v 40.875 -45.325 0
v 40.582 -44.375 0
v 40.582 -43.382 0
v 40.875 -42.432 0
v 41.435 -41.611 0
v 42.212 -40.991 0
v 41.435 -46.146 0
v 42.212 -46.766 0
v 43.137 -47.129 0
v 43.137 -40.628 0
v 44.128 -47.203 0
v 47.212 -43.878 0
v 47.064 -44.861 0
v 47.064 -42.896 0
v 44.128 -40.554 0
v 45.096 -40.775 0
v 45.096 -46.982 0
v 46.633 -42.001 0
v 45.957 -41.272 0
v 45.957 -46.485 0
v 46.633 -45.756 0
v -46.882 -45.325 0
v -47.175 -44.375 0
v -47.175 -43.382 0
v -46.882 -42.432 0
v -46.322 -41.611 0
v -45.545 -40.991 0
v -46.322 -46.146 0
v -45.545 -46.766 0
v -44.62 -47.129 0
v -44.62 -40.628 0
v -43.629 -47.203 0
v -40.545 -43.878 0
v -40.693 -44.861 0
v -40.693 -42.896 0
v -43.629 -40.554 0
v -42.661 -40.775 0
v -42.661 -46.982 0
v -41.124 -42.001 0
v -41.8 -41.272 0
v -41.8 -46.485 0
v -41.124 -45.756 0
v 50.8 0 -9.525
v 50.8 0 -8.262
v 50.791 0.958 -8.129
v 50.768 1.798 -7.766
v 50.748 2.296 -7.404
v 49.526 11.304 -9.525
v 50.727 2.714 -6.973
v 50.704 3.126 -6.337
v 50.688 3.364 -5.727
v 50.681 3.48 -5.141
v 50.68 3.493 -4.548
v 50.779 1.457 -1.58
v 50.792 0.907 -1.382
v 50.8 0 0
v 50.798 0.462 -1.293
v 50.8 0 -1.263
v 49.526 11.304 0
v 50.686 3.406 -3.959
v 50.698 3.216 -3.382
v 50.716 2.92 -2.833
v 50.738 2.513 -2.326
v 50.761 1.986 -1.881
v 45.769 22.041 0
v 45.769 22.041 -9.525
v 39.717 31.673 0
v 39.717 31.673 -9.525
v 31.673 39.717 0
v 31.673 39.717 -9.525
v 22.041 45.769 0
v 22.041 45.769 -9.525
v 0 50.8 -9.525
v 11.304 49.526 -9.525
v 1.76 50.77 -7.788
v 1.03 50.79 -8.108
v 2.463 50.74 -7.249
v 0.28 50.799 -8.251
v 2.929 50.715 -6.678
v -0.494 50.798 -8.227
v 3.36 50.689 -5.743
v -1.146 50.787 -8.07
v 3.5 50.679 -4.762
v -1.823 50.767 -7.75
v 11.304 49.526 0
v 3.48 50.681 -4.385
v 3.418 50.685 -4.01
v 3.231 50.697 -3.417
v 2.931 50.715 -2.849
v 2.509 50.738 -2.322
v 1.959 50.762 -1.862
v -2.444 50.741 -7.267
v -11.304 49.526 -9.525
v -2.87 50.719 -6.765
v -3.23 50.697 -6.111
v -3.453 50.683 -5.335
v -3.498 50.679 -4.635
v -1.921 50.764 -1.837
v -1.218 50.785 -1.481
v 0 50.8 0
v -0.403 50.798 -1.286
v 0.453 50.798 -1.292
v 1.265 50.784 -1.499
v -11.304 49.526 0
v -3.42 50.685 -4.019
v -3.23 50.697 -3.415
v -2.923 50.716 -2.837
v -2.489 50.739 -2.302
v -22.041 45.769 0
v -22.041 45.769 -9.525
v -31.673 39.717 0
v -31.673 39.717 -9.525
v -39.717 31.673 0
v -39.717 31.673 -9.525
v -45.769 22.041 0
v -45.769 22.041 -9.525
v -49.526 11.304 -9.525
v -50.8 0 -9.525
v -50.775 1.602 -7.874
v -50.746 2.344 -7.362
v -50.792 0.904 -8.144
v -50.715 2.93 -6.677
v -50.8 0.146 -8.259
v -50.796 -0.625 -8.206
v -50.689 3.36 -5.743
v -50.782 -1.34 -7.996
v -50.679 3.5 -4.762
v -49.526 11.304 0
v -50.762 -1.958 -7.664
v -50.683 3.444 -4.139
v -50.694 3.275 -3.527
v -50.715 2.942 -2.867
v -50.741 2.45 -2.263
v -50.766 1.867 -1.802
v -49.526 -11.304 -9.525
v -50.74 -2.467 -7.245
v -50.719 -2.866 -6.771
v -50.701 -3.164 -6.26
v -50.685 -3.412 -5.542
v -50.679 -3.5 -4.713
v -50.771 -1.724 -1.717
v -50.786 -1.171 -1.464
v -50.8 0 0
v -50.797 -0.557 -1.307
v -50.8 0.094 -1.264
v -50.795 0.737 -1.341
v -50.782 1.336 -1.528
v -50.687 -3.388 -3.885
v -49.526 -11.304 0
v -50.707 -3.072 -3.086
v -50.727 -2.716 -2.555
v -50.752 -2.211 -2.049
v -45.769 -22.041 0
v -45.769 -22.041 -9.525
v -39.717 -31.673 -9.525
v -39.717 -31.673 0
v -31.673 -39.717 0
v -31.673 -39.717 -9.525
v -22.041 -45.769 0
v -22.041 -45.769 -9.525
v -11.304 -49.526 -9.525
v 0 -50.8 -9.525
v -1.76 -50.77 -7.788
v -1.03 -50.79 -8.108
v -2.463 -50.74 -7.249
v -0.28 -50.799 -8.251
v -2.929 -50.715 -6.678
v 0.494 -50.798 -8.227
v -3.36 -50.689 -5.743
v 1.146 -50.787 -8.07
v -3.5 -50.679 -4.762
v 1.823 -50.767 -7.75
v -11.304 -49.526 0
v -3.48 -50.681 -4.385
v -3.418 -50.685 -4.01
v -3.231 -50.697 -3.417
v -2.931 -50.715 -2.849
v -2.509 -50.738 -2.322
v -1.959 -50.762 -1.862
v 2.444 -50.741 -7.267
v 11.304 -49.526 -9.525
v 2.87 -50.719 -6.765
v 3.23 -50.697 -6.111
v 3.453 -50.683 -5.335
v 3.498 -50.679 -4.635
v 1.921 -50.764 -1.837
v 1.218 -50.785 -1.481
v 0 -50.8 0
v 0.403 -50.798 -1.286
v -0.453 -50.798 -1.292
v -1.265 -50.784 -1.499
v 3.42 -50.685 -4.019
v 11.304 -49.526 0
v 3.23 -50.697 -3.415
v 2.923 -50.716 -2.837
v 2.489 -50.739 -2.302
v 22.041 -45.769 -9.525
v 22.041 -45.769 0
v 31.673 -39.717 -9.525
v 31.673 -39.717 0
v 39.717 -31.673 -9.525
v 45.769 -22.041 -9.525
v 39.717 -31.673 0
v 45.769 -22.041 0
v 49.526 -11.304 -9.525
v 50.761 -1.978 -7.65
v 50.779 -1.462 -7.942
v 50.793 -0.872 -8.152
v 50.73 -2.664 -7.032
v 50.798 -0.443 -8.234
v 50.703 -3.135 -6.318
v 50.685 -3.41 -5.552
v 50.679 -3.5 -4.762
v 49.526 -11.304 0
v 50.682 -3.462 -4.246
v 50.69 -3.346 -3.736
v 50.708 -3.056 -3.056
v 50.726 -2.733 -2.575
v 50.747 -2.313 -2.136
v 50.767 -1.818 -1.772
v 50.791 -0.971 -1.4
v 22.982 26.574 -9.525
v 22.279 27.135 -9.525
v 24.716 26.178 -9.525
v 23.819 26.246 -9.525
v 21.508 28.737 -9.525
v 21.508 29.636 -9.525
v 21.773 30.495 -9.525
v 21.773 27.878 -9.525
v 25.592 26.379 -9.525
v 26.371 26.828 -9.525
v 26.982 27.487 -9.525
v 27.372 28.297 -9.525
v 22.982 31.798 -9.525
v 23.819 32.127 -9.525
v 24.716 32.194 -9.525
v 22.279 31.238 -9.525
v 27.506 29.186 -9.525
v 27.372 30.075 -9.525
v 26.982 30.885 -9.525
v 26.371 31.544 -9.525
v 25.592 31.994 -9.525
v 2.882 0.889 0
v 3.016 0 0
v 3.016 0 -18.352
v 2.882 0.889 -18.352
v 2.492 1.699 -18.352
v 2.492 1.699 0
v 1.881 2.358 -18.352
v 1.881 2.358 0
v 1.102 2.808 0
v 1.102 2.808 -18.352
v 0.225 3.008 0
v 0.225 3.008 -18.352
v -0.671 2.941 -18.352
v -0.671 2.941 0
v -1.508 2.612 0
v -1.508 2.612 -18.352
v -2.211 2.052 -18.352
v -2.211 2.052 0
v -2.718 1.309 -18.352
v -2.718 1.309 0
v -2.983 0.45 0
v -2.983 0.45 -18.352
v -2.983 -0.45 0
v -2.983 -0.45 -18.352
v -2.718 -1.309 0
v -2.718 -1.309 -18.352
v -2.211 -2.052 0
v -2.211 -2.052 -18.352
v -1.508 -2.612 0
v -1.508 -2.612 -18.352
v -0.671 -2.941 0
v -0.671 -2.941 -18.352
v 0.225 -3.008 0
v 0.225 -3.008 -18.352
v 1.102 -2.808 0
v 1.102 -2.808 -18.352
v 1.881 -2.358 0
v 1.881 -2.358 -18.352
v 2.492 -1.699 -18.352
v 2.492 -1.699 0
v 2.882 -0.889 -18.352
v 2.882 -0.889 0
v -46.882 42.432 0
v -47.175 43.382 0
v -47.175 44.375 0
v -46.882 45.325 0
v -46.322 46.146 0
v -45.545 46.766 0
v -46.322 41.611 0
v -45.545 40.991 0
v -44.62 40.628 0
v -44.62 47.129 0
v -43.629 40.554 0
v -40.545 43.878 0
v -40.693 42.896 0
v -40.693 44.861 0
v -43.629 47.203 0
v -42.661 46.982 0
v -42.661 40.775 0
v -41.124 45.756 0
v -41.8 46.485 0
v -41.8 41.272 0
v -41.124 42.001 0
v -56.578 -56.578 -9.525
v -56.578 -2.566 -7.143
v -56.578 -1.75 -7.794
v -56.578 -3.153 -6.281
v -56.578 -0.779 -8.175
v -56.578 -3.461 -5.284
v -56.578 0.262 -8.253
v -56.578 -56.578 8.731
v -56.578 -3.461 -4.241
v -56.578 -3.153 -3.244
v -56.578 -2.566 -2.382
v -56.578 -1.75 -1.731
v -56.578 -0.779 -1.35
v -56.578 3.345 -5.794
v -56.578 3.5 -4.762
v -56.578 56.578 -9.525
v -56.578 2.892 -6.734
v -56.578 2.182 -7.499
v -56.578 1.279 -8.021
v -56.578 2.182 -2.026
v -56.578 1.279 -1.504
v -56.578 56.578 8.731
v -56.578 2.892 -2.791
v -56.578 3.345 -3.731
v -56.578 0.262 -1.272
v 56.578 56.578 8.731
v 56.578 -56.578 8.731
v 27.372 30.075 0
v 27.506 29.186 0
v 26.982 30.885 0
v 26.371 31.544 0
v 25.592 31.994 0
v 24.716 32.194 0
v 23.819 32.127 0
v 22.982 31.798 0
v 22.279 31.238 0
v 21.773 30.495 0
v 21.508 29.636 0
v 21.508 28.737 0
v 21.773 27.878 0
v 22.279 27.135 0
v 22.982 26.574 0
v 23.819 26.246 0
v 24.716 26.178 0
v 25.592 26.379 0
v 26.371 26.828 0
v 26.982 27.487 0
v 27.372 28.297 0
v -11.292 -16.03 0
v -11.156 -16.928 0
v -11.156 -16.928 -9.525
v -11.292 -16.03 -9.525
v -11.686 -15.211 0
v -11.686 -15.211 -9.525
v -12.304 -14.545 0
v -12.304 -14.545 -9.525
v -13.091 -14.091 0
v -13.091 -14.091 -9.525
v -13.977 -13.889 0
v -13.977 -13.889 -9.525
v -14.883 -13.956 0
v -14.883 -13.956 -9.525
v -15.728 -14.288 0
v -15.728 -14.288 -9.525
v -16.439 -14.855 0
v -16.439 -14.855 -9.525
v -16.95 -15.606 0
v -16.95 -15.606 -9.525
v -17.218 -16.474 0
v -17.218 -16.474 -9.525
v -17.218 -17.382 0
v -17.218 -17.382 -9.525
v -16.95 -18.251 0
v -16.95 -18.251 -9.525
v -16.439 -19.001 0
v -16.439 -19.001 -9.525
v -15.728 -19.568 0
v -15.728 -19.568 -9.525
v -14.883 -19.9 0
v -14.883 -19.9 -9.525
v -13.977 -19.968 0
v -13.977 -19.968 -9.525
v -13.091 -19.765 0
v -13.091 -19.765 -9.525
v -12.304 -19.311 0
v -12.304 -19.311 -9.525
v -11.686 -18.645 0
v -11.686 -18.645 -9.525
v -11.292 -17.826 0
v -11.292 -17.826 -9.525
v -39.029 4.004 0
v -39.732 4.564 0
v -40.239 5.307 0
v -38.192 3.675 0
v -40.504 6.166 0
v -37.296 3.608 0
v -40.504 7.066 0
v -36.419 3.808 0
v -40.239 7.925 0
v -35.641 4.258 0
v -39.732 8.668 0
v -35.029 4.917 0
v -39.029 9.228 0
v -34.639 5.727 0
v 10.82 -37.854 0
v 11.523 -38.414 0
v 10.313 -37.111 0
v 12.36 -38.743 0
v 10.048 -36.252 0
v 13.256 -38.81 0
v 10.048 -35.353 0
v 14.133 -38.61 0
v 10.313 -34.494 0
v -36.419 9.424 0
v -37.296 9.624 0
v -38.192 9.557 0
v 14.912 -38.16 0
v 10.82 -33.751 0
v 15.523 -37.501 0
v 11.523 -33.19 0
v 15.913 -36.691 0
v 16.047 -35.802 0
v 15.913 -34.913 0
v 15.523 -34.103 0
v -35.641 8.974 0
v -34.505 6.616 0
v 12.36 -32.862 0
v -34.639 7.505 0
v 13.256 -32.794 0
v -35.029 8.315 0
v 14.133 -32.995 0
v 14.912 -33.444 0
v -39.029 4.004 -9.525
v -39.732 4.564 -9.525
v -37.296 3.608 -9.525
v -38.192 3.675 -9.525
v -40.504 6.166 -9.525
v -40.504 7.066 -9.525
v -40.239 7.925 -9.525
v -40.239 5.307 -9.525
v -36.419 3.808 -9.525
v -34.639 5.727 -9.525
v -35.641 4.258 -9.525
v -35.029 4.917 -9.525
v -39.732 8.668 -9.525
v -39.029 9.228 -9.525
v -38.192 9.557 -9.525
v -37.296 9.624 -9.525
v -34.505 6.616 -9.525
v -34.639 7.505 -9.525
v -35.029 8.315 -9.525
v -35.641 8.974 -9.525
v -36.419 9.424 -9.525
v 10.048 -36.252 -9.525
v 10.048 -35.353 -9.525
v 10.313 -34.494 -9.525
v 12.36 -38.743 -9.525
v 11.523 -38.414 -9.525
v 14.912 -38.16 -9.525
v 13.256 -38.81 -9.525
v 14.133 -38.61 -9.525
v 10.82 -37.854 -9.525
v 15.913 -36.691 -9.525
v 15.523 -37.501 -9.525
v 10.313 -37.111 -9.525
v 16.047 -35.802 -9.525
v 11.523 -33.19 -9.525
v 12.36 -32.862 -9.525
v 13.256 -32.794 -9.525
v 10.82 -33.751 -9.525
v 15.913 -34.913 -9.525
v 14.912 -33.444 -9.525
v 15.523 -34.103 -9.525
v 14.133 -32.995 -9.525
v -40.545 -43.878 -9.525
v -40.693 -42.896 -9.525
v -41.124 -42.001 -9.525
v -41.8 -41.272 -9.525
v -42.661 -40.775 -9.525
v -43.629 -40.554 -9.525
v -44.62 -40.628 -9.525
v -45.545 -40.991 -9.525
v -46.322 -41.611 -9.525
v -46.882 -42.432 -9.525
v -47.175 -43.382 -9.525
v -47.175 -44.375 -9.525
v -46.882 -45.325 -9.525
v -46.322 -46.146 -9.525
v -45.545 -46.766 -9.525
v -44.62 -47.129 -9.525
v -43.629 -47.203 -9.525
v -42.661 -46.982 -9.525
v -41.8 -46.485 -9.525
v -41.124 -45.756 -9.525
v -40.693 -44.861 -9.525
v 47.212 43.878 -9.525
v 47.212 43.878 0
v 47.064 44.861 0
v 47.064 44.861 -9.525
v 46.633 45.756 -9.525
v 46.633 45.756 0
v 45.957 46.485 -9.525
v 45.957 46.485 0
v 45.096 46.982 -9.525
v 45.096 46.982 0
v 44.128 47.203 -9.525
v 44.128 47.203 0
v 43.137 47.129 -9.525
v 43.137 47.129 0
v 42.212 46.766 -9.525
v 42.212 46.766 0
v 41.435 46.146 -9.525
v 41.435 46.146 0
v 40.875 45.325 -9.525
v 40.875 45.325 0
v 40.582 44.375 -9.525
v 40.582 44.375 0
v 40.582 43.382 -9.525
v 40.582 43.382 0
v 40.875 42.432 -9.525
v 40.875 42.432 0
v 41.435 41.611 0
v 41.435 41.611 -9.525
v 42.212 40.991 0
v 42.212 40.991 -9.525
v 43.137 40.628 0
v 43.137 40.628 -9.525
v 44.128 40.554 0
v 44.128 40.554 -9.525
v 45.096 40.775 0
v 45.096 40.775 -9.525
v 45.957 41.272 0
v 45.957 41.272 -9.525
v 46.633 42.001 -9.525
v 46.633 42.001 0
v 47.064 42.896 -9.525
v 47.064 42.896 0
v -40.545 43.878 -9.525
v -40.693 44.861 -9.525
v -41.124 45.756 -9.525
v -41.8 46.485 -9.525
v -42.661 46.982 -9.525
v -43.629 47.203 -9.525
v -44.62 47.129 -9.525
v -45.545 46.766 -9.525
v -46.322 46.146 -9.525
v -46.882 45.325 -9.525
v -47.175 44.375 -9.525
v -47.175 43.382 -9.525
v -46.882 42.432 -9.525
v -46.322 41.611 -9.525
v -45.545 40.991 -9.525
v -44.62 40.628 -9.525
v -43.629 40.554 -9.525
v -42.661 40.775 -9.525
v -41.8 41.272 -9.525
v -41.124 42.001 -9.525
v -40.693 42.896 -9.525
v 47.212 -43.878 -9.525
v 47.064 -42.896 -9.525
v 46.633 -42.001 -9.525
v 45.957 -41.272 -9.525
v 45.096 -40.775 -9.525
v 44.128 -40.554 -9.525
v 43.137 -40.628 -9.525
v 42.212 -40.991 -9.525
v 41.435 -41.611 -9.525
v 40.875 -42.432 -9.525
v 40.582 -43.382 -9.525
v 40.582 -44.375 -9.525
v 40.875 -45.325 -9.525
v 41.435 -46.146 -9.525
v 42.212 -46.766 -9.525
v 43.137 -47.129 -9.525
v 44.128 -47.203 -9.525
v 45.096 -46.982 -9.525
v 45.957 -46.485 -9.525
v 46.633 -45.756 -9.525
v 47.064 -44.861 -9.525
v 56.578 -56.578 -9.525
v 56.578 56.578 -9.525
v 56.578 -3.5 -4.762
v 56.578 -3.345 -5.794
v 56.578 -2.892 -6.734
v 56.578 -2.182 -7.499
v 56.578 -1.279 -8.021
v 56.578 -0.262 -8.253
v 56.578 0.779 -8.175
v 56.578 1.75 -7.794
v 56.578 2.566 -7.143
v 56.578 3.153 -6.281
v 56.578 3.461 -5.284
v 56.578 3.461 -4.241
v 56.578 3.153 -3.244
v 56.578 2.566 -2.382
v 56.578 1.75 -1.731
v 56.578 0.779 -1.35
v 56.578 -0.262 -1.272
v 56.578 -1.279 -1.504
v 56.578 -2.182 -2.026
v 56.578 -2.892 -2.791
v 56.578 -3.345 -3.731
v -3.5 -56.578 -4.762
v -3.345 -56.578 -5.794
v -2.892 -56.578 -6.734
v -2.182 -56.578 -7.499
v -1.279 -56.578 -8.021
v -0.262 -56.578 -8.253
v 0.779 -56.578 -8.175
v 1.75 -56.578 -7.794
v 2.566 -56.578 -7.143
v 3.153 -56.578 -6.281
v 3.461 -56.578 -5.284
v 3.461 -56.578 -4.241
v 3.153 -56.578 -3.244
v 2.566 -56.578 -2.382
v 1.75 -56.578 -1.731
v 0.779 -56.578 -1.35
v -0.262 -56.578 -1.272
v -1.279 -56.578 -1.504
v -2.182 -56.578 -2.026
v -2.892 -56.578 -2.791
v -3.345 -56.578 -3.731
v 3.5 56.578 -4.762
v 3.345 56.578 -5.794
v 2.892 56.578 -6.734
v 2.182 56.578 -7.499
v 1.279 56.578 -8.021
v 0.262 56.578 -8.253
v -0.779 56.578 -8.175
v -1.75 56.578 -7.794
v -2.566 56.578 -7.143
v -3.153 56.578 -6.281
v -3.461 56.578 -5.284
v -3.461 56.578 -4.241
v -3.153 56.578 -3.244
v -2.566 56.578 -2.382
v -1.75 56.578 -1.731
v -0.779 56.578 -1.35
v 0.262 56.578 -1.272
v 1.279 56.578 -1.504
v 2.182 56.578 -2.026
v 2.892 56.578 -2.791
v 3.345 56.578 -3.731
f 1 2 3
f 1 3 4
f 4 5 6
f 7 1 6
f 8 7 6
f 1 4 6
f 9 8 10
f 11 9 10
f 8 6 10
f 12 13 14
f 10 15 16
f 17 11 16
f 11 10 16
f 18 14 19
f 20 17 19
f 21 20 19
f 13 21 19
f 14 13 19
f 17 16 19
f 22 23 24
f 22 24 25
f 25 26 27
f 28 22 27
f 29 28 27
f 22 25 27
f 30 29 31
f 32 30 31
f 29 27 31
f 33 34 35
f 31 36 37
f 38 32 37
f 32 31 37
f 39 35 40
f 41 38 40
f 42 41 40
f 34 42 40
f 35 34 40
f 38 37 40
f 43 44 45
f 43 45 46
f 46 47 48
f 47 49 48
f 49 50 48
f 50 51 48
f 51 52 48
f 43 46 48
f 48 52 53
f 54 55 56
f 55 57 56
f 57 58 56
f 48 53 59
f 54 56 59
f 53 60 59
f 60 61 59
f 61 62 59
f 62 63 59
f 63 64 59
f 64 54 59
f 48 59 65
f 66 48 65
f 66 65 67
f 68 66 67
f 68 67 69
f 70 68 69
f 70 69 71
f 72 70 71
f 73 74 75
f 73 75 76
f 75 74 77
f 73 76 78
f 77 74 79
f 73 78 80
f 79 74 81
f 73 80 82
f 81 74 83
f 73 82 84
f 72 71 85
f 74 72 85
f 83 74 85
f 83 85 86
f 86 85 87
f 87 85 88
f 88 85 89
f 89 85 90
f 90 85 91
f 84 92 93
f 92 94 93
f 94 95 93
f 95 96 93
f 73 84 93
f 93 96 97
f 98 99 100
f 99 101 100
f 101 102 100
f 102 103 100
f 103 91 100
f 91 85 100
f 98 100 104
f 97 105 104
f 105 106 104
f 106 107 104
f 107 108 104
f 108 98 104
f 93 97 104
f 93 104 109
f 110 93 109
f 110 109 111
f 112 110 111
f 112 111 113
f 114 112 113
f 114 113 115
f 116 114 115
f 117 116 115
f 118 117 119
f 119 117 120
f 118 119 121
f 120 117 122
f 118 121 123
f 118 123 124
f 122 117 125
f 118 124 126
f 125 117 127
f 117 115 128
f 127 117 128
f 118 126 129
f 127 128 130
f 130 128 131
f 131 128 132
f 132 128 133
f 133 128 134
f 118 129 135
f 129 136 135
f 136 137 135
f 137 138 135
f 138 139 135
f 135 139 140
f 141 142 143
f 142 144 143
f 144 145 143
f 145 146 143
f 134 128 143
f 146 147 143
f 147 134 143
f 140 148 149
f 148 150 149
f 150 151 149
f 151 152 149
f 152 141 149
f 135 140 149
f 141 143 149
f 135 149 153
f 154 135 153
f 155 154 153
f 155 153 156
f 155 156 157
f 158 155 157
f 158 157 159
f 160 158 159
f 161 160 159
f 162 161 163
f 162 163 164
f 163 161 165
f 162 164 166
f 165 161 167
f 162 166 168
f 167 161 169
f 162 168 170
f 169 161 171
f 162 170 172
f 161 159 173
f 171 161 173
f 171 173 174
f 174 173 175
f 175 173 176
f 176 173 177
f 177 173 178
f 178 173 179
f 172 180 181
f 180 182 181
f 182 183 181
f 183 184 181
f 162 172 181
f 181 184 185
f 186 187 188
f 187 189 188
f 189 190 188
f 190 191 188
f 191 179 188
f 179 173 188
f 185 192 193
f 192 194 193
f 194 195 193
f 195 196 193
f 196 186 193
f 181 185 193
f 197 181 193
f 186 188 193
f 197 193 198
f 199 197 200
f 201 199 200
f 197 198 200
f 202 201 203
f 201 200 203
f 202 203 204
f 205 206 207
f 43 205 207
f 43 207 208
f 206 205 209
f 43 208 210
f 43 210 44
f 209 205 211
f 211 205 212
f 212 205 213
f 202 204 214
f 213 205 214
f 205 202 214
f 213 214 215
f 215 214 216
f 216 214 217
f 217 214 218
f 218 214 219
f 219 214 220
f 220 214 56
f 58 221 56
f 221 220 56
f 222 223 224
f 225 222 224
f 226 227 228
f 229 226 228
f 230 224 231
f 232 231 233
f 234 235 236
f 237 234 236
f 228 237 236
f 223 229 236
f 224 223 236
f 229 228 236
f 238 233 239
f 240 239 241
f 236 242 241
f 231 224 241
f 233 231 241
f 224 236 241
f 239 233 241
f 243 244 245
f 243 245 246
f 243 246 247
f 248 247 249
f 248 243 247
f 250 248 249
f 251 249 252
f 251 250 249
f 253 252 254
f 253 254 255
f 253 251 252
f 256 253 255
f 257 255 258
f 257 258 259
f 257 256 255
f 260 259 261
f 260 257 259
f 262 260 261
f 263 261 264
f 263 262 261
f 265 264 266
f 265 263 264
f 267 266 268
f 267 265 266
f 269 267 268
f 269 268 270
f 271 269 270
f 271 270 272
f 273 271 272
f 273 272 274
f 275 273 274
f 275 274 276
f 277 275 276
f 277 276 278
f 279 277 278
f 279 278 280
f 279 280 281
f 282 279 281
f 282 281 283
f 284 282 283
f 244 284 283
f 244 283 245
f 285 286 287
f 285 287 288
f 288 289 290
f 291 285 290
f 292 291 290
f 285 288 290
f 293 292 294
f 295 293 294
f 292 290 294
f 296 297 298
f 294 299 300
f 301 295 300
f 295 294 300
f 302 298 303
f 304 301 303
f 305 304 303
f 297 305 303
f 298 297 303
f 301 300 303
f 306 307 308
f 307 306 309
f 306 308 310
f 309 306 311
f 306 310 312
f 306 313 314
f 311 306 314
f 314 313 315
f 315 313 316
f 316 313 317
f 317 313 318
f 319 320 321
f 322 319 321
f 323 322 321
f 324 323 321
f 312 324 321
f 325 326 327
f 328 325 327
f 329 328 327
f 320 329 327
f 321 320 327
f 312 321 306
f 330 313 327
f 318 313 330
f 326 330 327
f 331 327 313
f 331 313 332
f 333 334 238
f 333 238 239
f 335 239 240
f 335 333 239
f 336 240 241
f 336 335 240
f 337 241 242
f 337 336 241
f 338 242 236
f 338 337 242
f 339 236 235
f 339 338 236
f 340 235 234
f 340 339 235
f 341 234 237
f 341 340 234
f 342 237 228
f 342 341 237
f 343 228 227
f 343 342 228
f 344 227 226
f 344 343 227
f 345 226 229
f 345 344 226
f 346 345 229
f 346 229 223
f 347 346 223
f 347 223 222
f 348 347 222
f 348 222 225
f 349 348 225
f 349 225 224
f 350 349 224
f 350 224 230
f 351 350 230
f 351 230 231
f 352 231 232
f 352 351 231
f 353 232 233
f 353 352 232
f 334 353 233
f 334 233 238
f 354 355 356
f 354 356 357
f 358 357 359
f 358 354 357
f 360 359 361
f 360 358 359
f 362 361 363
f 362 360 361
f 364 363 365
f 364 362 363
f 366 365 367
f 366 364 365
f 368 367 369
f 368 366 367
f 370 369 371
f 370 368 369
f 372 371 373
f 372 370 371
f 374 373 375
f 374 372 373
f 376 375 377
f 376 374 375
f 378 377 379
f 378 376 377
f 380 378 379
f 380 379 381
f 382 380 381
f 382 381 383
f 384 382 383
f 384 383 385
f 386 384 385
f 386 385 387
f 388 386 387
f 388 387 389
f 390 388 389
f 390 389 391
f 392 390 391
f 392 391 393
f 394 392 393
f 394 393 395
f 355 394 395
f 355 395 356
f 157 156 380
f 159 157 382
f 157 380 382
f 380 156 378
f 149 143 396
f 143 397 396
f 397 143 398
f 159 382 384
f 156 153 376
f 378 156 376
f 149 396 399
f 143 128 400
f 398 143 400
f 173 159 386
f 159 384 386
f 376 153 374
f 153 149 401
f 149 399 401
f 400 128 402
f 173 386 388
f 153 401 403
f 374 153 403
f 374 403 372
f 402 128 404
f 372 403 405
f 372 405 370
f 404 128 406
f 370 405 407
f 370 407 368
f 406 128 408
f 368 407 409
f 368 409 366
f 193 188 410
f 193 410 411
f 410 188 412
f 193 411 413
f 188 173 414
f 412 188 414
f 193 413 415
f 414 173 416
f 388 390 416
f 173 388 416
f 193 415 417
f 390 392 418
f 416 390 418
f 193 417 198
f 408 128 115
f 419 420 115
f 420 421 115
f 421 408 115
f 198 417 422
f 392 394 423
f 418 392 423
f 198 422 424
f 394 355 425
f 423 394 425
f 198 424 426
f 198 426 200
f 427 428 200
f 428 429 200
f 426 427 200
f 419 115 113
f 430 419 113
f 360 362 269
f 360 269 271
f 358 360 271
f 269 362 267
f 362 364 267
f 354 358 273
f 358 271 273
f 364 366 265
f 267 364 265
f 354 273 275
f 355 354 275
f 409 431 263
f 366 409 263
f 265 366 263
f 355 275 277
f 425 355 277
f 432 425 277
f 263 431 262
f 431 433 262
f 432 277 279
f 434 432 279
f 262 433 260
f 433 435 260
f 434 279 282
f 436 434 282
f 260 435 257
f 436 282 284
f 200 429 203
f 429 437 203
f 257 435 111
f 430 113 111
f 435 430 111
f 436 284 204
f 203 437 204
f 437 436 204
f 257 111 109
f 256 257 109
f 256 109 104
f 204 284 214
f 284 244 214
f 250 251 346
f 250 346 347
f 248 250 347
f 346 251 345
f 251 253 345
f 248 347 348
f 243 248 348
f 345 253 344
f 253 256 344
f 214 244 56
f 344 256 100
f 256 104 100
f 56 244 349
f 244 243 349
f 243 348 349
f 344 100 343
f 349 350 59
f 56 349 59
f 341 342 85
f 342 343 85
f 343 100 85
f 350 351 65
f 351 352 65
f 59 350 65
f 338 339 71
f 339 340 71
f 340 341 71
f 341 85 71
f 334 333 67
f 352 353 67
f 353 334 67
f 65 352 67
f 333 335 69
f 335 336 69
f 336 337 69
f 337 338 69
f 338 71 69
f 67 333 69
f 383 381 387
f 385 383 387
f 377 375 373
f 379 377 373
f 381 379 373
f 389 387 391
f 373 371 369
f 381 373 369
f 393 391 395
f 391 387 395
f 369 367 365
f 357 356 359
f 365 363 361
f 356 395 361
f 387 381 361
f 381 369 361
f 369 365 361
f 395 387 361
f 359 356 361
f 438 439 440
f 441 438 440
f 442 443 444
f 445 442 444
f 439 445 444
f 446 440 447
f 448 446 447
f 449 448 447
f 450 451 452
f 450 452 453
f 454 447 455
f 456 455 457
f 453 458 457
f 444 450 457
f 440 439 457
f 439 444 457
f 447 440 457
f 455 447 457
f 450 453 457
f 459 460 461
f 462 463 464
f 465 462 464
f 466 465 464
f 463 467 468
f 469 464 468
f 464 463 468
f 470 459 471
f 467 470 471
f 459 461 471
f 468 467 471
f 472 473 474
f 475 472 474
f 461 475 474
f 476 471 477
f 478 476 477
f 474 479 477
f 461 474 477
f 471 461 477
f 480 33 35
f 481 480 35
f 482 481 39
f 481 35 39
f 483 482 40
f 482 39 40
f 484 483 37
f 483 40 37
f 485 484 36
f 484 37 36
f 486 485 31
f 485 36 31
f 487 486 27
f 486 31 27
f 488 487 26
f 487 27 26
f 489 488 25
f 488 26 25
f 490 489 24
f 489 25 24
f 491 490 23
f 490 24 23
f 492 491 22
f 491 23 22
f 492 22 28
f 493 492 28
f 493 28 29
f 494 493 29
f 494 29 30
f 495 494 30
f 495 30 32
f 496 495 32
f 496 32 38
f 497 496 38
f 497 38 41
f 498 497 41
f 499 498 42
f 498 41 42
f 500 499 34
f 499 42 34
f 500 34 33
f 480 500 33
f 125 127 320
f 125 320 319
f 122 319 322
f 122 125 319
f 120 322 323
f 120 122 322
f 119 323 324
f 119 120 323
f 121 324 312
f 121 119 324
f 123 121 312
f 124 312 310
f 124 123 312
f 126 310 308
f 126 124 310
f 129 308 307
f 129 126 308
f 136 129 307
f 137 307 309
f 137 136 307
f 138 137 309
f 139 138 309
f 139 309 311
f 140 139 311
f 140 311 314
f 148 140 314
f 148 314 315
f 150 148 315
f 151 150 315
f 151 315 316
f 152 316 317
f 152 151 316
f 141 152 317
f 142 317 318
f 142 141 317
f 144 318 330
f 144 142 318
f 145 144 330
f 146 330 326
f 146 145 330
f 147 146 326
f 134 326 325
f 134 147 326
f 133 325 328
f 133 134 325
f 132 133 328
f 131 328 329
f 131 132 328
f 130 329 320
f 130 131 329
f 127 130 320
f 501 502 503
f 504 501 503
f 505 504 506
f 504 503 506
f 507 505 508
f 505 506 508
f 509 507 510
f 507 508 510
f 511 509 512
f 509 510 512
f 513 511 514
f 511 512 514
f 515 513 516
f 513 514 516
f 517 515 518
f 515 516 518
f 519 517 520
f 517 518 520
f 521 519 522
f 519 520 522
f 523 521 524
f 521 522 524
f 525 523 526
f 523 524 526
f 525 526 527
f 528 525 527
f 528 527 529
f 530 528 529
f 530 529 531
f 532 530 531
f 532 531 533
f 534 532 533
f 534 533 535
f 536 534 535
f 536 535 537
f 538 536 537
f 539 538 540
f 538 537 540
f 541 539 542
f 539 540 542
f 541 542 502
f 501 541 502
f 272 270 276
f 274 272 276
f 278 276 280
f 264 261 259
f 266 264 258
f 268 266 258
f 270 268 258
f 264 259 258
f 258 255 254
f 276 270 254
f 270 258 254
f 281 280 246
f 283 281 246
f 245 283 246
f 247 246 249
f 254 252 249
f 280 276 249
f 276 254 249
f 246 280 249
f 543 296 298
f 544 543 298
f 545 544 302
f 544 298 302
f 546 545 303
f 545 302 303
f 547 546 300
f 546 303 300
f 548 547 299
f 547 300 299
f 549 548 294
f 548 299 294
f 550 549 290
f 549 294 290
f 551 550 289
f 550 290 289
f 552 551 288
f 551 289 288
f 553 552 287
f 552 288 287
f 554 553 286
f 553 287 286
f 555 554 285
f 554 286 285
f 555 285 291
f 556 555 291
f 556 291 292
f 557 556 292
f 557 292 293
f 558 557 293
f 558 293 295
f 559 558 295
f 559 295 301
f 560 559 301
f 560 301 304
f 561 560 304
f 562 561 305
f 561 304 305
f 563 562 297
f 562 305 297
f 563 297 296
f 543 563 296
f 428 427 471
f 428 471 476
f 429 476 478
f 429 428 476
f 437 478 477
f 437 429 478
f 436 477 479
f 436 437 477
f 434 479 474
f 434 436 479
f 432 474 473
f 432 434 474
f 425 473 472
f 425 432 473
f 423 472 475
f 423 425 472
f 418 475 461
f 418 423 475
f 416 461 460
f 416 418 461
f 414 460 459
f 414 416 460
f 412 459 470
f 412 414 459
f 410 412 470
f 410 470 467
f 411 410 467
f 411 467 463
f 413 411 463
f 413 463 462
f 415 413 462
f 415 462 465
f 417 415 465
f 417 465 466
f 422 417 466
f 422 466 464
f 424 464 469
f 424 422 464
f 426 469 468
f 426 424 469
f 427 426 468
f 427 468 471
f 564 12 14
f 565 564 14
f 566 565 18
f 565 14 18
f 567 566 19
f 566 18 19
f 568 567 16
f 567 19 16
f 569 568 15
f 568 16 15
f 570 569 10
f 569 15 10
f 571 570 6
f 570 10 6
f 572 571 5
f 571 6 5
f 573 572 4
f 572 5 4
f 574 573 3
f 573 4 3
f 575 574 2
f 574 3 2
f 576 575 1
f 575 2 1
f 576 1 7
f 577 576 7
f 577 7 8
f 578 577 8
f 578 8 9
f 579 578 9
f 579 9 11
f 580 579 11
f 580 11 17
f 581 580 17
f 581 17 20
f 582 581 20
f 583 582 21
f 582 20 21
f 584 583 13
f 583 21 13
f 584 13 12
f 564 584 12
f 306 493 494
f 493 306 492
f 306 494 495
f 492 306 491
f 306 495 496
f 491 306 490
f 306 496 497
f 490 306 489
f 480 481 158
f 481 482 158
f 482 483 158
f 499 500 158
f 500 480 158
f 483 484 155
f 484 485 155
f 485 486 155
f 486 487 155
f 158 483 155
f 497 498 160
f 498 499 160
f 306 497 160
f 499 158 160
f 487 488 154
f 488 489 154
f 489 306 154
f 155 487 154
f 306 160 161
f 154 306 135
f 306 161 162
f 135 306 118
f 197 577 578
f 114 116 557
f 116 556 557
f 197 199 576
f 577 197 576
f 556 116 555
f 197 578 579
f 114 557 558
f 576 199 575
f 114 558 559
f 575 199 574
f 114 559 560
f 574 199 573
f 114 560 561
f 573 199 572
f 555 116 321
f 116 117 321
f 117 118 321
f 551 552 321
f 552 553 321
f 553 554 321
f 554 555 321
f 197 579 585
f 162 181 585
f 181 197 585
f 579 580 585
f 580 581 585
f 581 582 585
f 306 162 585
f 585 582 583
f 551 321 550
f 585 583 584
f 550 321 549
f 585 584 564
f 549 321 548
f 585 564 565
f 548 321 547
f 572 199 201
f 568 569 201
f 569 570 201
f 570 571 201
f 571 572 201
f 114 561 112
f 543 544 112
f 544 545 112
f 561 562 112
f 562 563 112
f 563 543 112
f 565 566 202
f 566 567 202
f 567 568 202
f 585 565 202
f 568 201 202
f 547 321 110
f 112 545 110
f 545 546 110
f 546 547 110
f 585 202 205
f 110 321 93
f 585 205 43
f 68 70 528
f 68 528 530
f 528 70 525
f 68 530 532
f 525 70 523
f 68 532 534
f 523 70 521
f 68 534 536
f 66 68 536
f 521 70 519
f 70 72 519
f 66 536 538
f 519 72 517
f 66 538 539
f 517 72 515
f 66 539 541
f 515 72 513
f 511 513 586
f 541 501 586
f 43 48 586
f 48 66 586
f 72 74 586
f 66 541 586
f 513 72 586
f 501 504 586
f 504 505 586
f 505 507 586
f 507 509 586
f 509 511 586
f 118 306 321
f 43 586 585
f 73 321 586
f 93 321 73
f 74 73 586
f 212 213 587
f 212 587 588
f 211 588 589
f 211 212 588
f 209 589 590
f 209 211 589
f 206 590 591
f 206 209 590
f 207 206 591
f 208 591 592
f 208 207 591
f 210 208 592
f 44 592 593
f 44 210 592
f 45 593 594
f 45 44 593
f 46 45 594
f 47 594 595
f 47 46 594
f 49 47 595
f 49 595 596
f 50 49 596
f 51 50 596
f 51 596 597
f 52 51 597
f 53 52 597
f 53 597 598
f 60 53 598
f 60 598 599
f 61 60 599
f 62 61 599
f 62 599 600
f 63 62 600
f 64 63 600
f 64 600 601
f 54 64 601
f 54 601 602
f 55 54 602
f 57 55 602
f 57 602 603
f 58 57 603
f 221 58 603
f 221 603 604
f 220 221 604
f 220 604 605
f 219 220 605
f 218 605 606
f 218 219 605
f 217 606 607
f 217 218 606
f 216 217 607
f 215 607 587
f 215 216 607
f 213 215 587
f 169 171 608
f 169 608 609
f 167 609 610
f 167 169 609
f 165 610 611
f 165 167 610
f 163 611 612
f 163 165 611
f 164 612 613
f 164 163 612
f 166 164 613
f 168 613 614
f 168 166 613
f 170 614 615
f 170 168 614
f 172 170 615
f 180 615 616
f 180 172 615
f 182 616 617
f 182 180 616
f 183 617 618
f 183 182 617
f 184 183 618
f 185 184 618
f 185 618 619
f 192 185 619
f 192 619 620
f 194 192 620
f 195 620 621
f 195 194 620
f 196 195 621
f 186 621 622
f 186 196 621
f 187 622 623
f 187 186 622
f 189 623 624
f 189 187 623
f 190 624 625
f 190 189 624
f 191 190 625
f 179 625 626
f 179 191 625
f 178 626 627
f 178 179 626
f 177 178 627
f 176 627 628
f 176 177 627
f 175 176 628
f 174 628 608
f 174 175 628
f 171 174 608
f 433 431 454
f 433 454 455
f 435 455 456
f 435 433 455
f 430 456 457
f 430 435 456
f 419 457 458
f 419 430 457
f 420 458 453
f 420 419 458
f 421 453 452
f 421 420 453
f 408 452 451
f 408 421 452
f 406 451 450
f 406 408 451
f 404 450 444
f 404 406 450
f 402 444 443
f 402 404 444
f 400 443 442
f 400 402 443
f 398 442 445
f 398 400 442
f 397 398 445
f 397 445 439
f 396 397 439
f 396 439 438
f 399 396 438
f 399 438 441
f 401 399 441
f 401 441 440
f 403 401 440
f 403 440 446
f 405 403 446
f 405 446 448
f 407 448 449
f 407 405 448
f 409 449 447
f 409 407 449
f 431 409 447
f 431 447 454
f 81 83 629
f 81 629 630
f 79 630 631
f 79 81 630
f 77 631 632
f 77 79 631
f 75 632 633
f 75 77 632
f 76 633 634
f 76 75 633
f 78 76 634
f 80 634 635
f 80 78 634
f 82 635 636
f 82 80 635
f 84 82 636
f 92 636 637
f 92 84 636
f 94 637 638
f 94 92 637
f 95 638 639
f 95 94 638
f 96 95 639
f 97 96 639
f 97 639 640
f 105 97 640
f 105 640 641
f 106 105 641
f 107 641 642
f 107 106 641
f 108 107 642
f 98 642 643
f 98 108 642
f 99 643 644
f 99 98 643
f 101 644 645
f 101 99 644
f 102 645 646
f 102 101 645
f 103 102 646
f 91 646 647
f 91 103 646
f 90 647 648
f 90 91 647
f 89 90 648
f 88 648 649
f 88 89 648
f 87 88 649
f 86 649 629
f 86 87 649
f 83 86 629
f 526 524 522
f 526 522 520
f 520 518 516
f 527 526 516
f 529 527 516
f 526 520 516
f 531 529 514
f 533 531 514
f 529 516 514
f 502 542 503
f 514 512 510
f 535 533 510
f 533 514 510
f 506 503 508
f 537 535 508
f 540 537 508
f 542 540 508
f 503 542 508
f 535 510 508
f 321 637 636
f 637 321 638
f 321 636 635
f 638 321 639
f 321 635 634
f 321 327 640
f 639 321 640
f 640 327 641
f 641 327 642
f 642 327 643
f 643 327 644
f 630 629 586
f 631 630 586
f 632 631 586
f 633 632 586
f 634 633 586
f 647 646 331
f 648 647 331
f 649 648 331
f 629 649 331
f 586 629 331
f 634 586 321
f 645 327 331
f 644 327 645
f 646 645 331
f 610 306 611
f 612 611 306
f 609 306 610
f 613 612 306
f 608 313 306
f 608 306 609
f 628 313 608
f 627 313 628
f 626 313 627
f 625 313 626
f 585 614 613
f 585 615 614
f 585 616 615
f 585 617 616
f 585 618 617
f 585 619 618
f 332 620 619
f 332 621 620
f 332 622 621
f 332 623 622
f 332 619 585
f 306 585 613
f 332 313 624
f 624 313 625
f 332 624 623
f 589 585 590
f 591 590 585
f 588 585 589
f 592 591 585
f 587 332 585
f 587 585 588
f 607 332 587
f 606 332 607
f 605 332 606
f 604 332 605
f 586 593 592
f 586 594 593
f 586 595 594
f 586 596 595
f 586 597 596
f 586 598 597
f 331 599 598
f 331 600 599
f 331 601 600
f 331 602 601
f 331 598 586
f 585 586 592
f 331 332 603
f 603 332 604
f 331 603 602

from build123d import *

# Parameters (mm, degrees)
SKETCH1_W           = 113.157
SKETCH1_H           = 113.157
SKETCH1_R           = 3.048
BOSS_EXTRUDE1_DEPTH = 8.73125
SKETCH1_3_W         = 113.157
SKETCH1_3_H         = 113.157
SKETCH1_3_R         = 3.33375
SKETCH1_3_R_2       = 50.8
SKETCH1_3_R_3       = 3.01625
SKETCH1_3_R_4       = 3.048
BOSS_EXTRUDE2_DEPTH = 9.525
SKETCH1_4_R         = 3.01625
BOSS_EXTRUDE3_DEPTH = 18.3515
CUT_EXTRUDE1_START  = -5.899214
SKETCH2_R           = 3.5
CUT_EXTRUDE1_DEPTH  = 5.899214
CIRPATTERN1_COUNT   = 4
SKETCH5_R           = 3.047999999
BOSS_EXTRUDE4_DEPTH = 9.525


with BuildPart() as part:
    # Sketch1 → Boss-Extrude1 (new body)
    with BuildSketch(Plane.XY):
        Rectangle(SKETCH1_W, SKETCH1_H)
        with Locations((-14.204320599, -16.928050104)):
            Circle(SKETCH1_R, mode=Mode.SUBTRACT)
    extrude(amount=BOSS_EXTRUDE1_DEPTH)

    # Sketch1<3> → Boss-Extrude2 (add)
    with BuildSketch(Plane.XY):
        Rectangle(SKETCH1_3_W, SKETCH1_3_H)
        with Locations((-43.8785, -43.8785)):
            Circle(SKETCH1_3_R, mode=Mode.SUBTRACT)
        with Locations((43.8785, -43.8785)):
            Circle(SKETCH1_3_R, mode=Mode.SUBTRACT)
        with Locations((43.8785, 43.8785)):
            Circle(SKETCH1_3_R, mode=Mode.SUBTRACT)
        with Locations((-43.8785, 43.8785)):
            Circle(SKETCH1_3_R, mode=Mode.SUBTRACT)
        Circle(SKETCH1_3_R_2, mode=Mode.SUBTRACT)
        with Locations((24.490207929, 29.186293283)):
            Circle(SKETCH1_3_R_3)
        with Locations((13.030967461, -35.802288852)):
            Circle(SKETCH1_3_R_3)
        Circle(SKETCH1_3_R_3)
        with Locations((-37.52117539, 6.615995569)):
            Circle(SKETCH1_3_R_3)
        with Locations((-14.204320599, -16.928050104)):
            Circle(SKETCH1_3_R_4)
    extrude(amount=-BOSS_EXTRUDE2_DEPTH)

    # Sketch1<4> → Boss-Extrude3 (add)
    with BuildSketch(Plane.XY):
        Circle(SKETCH1_4_R)
    extrude(amount=-BOSS_EXTRUDE3_DEPTH)

    # Sketch2 → Cut-Extrude1 (cut)
    with BuildSketch(Plane(origin=(0, 56.5785, 0), x_dir=(1, 0, 0), z_dir=(0, 1, 0)).offset(CUT_EXTRUDE1_START)):
        with Locations((0, 4.7625)):
            Circle(SKETCH2_R)
    cut_extrude1 = extrude(amount=CUT_EXTRUDE1_DEPTH, mode=Mode.SUBTRACT)

    # CirPattern1: Cut-Extrude1 ×4 about axis
    cirpattern1_axis = Axis((0, 0, -9.525), (0, 0, 1))
    for i in range(1, CIRPATTERN1_COUNT):
        add(cut_extrude1.rotate(cirpattern1_axis, i * 360 / CIRPATTERN1_COUNT), mode=Mode.SUBTRACT)

    # Sketch5 → Boss-Extrude4 (add)
    with BuildSketch(Plane.XY.offset(8.73125)):
        with Locations((-14.204320599, -16.928050104)):
            Circle(SKETCH5_R)
    extrude(amount=-BOSS_EXTRUDE4_DEPTH)


solid = part.part
